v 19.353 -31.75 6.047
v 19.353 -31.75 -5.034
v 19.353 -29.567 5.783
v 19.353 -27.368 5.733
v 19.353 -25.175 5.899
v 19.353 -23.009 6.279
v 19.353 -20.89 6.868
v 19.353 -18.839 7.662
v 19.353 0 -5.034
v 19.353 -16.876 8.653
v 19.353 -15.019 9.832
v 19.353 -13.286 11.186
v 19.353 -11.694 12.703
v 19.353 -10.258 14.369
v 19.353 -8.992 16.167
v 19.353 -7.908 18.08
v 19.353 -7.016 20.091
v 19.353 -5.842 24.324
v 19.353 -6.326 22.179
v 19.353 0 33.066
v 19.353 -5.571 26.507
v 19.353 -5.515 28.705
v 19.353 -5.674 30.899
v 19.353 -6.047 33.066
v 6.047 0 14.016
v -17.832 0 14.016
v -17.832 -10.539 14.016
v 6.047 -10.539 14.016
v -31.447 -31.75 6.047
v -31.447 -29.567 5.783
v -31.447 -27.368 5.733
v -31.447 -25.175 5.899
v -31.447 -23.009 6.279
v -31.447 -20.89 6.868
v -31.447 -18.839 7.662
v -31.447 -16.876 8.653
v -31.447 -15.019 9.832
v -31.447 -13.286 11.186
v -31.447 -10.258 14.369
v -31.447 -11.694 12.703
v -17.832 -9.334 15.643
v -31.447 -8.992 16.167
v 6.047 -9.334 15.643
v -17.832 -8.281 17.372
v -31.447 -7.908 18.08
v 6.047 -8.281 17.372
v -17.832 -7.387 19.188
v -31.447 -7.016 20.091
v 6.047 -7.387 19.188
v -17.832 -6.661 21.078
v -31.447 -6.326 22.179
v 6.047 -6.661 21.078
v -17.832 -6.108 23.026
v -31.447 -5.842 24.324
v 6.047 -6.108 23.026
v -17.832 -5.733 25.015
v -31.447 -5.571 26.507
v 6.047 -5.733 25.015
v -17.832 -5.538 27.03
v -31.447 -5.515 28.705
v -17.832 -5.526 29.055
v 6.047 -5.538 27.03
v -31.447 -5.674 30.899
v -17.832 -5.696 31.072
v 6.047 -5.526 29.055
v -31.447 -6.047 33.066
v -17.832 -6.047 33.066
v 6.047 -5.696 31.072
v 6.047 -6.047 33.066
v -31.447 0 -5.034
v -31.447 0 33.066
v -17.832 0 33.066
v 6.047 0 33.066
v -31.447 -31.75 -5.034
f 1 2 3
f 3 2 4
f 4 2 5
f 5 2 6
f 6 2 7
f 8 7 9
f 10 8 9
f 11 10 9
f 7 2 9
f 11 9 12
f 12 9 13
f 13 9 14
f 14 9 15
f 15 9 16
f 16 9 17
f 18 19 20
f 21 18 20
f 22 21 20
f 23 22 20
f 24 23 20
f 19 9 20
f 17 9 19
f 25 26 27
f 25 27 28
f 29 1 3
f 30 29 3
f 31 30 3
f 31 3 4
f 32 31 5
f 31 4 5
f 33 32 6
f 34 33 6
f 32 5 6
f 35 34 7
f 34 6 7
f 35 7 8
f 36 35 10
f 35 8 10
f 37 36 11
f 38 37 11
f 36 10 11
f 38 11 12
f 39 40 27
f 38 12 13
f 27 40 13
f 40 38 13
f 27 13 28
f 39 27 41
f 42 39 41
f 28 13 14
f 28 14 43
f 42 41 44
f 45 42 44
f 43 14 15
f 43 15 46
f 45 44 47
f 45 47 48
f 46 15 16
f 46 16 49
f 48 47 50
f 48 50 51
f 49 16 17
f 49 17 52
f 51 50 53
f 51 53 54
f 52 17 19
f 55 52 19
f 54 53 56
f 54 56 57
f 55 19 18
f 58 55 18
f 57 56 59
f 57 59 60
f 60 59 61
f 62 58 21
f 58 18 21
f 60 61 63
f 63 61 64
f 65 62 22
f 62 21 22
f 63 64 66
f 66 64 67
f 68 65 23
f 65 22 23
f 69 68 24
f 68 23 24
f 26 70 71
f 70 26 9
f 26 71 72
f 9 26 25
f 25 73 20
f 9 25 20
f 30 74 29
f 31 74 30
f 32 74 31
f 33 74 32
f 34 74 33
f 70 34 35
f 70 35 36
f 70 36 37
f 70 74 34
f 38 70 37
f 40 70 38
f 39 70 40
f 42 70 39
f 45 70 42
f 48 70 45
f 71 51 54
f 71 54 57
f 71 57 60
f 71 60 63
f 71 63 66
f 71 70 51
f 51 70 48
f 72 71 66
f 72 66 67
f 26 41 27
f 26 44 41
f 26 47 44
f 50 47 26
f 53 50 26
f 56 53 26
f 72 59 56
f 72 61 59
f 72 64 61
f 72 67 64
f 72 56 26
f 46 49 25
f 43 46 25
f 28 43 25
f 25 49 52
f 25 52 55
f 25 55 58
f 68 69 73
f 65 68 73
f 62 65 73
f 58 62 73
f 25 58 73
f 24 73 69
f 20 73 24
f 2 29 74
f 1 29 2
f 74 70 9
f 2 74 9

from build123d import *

# Parameters (mm, degrees)
F0_W     = 50.8
F0_H     = 38.1
F1_DEPTH = 31.75
F3_DEPTH = 50.8
F4_W     = 18.9170949161
F4_H     = 6.0472670011
F4_W_2   = 4.9618594348
F5_DEPTH = 19.05
F6_DEPTH = 25.4


with BuildPart() as f1:
    # F0 (on Front) → F1 (new body)
    with BuildSketch(Plane.XZ):
        with Locations((-6.0472674668, 14.0159087854)):
            Rectangle(F0_W, F0_H)
    extrude(amount=F1_DEPTH)

    # F2 (on face) → F3 (cut)
    with BuildSketch(Plane.YZ.offset(19.3527325332)):
        with BuildLine():
            Line((-31.75, 33.0659087854), (-31.75, 6.0472674668))
            ThreePointArc((-31.75, 6.0472674668), (-11.6942038752, 12.7030410182), (-6.0472670011, 33.0659087854))
            Line((-6.0472670011, 33.0659087854), (-31.75, 33.0659087854))
        make_face()
    extrude(amount=-F3_DEPTH, mode=Mode.SUBTRACT)

    # F4 (on face) → F5 (cut)
    with BuildSketch(Plane.XY.offset(33.0659087854)):
        with Locations((-3.4112781286, -3.0236335006)):
            Rectangle(F4_W, F4_H)
        with Locations((-15.3507553041, -3.0236335006)):
            Rectangle(F4_W_2, F4_H)
    extrude(amount=-F5_DEPTH, mode=Mode.SUBTRACT)

    # F6 (cut): a face of the model
    f6_faces = [f1.faces().sort_by_distance(p)[0] for p in [
        (-5.892207846, -6.0472670011, 18.653876051),
    ]]
    extrude(f6_faces, amount=-F6_DEPTH, mode=Mode.SUBTRACT)


solid = f1.part
